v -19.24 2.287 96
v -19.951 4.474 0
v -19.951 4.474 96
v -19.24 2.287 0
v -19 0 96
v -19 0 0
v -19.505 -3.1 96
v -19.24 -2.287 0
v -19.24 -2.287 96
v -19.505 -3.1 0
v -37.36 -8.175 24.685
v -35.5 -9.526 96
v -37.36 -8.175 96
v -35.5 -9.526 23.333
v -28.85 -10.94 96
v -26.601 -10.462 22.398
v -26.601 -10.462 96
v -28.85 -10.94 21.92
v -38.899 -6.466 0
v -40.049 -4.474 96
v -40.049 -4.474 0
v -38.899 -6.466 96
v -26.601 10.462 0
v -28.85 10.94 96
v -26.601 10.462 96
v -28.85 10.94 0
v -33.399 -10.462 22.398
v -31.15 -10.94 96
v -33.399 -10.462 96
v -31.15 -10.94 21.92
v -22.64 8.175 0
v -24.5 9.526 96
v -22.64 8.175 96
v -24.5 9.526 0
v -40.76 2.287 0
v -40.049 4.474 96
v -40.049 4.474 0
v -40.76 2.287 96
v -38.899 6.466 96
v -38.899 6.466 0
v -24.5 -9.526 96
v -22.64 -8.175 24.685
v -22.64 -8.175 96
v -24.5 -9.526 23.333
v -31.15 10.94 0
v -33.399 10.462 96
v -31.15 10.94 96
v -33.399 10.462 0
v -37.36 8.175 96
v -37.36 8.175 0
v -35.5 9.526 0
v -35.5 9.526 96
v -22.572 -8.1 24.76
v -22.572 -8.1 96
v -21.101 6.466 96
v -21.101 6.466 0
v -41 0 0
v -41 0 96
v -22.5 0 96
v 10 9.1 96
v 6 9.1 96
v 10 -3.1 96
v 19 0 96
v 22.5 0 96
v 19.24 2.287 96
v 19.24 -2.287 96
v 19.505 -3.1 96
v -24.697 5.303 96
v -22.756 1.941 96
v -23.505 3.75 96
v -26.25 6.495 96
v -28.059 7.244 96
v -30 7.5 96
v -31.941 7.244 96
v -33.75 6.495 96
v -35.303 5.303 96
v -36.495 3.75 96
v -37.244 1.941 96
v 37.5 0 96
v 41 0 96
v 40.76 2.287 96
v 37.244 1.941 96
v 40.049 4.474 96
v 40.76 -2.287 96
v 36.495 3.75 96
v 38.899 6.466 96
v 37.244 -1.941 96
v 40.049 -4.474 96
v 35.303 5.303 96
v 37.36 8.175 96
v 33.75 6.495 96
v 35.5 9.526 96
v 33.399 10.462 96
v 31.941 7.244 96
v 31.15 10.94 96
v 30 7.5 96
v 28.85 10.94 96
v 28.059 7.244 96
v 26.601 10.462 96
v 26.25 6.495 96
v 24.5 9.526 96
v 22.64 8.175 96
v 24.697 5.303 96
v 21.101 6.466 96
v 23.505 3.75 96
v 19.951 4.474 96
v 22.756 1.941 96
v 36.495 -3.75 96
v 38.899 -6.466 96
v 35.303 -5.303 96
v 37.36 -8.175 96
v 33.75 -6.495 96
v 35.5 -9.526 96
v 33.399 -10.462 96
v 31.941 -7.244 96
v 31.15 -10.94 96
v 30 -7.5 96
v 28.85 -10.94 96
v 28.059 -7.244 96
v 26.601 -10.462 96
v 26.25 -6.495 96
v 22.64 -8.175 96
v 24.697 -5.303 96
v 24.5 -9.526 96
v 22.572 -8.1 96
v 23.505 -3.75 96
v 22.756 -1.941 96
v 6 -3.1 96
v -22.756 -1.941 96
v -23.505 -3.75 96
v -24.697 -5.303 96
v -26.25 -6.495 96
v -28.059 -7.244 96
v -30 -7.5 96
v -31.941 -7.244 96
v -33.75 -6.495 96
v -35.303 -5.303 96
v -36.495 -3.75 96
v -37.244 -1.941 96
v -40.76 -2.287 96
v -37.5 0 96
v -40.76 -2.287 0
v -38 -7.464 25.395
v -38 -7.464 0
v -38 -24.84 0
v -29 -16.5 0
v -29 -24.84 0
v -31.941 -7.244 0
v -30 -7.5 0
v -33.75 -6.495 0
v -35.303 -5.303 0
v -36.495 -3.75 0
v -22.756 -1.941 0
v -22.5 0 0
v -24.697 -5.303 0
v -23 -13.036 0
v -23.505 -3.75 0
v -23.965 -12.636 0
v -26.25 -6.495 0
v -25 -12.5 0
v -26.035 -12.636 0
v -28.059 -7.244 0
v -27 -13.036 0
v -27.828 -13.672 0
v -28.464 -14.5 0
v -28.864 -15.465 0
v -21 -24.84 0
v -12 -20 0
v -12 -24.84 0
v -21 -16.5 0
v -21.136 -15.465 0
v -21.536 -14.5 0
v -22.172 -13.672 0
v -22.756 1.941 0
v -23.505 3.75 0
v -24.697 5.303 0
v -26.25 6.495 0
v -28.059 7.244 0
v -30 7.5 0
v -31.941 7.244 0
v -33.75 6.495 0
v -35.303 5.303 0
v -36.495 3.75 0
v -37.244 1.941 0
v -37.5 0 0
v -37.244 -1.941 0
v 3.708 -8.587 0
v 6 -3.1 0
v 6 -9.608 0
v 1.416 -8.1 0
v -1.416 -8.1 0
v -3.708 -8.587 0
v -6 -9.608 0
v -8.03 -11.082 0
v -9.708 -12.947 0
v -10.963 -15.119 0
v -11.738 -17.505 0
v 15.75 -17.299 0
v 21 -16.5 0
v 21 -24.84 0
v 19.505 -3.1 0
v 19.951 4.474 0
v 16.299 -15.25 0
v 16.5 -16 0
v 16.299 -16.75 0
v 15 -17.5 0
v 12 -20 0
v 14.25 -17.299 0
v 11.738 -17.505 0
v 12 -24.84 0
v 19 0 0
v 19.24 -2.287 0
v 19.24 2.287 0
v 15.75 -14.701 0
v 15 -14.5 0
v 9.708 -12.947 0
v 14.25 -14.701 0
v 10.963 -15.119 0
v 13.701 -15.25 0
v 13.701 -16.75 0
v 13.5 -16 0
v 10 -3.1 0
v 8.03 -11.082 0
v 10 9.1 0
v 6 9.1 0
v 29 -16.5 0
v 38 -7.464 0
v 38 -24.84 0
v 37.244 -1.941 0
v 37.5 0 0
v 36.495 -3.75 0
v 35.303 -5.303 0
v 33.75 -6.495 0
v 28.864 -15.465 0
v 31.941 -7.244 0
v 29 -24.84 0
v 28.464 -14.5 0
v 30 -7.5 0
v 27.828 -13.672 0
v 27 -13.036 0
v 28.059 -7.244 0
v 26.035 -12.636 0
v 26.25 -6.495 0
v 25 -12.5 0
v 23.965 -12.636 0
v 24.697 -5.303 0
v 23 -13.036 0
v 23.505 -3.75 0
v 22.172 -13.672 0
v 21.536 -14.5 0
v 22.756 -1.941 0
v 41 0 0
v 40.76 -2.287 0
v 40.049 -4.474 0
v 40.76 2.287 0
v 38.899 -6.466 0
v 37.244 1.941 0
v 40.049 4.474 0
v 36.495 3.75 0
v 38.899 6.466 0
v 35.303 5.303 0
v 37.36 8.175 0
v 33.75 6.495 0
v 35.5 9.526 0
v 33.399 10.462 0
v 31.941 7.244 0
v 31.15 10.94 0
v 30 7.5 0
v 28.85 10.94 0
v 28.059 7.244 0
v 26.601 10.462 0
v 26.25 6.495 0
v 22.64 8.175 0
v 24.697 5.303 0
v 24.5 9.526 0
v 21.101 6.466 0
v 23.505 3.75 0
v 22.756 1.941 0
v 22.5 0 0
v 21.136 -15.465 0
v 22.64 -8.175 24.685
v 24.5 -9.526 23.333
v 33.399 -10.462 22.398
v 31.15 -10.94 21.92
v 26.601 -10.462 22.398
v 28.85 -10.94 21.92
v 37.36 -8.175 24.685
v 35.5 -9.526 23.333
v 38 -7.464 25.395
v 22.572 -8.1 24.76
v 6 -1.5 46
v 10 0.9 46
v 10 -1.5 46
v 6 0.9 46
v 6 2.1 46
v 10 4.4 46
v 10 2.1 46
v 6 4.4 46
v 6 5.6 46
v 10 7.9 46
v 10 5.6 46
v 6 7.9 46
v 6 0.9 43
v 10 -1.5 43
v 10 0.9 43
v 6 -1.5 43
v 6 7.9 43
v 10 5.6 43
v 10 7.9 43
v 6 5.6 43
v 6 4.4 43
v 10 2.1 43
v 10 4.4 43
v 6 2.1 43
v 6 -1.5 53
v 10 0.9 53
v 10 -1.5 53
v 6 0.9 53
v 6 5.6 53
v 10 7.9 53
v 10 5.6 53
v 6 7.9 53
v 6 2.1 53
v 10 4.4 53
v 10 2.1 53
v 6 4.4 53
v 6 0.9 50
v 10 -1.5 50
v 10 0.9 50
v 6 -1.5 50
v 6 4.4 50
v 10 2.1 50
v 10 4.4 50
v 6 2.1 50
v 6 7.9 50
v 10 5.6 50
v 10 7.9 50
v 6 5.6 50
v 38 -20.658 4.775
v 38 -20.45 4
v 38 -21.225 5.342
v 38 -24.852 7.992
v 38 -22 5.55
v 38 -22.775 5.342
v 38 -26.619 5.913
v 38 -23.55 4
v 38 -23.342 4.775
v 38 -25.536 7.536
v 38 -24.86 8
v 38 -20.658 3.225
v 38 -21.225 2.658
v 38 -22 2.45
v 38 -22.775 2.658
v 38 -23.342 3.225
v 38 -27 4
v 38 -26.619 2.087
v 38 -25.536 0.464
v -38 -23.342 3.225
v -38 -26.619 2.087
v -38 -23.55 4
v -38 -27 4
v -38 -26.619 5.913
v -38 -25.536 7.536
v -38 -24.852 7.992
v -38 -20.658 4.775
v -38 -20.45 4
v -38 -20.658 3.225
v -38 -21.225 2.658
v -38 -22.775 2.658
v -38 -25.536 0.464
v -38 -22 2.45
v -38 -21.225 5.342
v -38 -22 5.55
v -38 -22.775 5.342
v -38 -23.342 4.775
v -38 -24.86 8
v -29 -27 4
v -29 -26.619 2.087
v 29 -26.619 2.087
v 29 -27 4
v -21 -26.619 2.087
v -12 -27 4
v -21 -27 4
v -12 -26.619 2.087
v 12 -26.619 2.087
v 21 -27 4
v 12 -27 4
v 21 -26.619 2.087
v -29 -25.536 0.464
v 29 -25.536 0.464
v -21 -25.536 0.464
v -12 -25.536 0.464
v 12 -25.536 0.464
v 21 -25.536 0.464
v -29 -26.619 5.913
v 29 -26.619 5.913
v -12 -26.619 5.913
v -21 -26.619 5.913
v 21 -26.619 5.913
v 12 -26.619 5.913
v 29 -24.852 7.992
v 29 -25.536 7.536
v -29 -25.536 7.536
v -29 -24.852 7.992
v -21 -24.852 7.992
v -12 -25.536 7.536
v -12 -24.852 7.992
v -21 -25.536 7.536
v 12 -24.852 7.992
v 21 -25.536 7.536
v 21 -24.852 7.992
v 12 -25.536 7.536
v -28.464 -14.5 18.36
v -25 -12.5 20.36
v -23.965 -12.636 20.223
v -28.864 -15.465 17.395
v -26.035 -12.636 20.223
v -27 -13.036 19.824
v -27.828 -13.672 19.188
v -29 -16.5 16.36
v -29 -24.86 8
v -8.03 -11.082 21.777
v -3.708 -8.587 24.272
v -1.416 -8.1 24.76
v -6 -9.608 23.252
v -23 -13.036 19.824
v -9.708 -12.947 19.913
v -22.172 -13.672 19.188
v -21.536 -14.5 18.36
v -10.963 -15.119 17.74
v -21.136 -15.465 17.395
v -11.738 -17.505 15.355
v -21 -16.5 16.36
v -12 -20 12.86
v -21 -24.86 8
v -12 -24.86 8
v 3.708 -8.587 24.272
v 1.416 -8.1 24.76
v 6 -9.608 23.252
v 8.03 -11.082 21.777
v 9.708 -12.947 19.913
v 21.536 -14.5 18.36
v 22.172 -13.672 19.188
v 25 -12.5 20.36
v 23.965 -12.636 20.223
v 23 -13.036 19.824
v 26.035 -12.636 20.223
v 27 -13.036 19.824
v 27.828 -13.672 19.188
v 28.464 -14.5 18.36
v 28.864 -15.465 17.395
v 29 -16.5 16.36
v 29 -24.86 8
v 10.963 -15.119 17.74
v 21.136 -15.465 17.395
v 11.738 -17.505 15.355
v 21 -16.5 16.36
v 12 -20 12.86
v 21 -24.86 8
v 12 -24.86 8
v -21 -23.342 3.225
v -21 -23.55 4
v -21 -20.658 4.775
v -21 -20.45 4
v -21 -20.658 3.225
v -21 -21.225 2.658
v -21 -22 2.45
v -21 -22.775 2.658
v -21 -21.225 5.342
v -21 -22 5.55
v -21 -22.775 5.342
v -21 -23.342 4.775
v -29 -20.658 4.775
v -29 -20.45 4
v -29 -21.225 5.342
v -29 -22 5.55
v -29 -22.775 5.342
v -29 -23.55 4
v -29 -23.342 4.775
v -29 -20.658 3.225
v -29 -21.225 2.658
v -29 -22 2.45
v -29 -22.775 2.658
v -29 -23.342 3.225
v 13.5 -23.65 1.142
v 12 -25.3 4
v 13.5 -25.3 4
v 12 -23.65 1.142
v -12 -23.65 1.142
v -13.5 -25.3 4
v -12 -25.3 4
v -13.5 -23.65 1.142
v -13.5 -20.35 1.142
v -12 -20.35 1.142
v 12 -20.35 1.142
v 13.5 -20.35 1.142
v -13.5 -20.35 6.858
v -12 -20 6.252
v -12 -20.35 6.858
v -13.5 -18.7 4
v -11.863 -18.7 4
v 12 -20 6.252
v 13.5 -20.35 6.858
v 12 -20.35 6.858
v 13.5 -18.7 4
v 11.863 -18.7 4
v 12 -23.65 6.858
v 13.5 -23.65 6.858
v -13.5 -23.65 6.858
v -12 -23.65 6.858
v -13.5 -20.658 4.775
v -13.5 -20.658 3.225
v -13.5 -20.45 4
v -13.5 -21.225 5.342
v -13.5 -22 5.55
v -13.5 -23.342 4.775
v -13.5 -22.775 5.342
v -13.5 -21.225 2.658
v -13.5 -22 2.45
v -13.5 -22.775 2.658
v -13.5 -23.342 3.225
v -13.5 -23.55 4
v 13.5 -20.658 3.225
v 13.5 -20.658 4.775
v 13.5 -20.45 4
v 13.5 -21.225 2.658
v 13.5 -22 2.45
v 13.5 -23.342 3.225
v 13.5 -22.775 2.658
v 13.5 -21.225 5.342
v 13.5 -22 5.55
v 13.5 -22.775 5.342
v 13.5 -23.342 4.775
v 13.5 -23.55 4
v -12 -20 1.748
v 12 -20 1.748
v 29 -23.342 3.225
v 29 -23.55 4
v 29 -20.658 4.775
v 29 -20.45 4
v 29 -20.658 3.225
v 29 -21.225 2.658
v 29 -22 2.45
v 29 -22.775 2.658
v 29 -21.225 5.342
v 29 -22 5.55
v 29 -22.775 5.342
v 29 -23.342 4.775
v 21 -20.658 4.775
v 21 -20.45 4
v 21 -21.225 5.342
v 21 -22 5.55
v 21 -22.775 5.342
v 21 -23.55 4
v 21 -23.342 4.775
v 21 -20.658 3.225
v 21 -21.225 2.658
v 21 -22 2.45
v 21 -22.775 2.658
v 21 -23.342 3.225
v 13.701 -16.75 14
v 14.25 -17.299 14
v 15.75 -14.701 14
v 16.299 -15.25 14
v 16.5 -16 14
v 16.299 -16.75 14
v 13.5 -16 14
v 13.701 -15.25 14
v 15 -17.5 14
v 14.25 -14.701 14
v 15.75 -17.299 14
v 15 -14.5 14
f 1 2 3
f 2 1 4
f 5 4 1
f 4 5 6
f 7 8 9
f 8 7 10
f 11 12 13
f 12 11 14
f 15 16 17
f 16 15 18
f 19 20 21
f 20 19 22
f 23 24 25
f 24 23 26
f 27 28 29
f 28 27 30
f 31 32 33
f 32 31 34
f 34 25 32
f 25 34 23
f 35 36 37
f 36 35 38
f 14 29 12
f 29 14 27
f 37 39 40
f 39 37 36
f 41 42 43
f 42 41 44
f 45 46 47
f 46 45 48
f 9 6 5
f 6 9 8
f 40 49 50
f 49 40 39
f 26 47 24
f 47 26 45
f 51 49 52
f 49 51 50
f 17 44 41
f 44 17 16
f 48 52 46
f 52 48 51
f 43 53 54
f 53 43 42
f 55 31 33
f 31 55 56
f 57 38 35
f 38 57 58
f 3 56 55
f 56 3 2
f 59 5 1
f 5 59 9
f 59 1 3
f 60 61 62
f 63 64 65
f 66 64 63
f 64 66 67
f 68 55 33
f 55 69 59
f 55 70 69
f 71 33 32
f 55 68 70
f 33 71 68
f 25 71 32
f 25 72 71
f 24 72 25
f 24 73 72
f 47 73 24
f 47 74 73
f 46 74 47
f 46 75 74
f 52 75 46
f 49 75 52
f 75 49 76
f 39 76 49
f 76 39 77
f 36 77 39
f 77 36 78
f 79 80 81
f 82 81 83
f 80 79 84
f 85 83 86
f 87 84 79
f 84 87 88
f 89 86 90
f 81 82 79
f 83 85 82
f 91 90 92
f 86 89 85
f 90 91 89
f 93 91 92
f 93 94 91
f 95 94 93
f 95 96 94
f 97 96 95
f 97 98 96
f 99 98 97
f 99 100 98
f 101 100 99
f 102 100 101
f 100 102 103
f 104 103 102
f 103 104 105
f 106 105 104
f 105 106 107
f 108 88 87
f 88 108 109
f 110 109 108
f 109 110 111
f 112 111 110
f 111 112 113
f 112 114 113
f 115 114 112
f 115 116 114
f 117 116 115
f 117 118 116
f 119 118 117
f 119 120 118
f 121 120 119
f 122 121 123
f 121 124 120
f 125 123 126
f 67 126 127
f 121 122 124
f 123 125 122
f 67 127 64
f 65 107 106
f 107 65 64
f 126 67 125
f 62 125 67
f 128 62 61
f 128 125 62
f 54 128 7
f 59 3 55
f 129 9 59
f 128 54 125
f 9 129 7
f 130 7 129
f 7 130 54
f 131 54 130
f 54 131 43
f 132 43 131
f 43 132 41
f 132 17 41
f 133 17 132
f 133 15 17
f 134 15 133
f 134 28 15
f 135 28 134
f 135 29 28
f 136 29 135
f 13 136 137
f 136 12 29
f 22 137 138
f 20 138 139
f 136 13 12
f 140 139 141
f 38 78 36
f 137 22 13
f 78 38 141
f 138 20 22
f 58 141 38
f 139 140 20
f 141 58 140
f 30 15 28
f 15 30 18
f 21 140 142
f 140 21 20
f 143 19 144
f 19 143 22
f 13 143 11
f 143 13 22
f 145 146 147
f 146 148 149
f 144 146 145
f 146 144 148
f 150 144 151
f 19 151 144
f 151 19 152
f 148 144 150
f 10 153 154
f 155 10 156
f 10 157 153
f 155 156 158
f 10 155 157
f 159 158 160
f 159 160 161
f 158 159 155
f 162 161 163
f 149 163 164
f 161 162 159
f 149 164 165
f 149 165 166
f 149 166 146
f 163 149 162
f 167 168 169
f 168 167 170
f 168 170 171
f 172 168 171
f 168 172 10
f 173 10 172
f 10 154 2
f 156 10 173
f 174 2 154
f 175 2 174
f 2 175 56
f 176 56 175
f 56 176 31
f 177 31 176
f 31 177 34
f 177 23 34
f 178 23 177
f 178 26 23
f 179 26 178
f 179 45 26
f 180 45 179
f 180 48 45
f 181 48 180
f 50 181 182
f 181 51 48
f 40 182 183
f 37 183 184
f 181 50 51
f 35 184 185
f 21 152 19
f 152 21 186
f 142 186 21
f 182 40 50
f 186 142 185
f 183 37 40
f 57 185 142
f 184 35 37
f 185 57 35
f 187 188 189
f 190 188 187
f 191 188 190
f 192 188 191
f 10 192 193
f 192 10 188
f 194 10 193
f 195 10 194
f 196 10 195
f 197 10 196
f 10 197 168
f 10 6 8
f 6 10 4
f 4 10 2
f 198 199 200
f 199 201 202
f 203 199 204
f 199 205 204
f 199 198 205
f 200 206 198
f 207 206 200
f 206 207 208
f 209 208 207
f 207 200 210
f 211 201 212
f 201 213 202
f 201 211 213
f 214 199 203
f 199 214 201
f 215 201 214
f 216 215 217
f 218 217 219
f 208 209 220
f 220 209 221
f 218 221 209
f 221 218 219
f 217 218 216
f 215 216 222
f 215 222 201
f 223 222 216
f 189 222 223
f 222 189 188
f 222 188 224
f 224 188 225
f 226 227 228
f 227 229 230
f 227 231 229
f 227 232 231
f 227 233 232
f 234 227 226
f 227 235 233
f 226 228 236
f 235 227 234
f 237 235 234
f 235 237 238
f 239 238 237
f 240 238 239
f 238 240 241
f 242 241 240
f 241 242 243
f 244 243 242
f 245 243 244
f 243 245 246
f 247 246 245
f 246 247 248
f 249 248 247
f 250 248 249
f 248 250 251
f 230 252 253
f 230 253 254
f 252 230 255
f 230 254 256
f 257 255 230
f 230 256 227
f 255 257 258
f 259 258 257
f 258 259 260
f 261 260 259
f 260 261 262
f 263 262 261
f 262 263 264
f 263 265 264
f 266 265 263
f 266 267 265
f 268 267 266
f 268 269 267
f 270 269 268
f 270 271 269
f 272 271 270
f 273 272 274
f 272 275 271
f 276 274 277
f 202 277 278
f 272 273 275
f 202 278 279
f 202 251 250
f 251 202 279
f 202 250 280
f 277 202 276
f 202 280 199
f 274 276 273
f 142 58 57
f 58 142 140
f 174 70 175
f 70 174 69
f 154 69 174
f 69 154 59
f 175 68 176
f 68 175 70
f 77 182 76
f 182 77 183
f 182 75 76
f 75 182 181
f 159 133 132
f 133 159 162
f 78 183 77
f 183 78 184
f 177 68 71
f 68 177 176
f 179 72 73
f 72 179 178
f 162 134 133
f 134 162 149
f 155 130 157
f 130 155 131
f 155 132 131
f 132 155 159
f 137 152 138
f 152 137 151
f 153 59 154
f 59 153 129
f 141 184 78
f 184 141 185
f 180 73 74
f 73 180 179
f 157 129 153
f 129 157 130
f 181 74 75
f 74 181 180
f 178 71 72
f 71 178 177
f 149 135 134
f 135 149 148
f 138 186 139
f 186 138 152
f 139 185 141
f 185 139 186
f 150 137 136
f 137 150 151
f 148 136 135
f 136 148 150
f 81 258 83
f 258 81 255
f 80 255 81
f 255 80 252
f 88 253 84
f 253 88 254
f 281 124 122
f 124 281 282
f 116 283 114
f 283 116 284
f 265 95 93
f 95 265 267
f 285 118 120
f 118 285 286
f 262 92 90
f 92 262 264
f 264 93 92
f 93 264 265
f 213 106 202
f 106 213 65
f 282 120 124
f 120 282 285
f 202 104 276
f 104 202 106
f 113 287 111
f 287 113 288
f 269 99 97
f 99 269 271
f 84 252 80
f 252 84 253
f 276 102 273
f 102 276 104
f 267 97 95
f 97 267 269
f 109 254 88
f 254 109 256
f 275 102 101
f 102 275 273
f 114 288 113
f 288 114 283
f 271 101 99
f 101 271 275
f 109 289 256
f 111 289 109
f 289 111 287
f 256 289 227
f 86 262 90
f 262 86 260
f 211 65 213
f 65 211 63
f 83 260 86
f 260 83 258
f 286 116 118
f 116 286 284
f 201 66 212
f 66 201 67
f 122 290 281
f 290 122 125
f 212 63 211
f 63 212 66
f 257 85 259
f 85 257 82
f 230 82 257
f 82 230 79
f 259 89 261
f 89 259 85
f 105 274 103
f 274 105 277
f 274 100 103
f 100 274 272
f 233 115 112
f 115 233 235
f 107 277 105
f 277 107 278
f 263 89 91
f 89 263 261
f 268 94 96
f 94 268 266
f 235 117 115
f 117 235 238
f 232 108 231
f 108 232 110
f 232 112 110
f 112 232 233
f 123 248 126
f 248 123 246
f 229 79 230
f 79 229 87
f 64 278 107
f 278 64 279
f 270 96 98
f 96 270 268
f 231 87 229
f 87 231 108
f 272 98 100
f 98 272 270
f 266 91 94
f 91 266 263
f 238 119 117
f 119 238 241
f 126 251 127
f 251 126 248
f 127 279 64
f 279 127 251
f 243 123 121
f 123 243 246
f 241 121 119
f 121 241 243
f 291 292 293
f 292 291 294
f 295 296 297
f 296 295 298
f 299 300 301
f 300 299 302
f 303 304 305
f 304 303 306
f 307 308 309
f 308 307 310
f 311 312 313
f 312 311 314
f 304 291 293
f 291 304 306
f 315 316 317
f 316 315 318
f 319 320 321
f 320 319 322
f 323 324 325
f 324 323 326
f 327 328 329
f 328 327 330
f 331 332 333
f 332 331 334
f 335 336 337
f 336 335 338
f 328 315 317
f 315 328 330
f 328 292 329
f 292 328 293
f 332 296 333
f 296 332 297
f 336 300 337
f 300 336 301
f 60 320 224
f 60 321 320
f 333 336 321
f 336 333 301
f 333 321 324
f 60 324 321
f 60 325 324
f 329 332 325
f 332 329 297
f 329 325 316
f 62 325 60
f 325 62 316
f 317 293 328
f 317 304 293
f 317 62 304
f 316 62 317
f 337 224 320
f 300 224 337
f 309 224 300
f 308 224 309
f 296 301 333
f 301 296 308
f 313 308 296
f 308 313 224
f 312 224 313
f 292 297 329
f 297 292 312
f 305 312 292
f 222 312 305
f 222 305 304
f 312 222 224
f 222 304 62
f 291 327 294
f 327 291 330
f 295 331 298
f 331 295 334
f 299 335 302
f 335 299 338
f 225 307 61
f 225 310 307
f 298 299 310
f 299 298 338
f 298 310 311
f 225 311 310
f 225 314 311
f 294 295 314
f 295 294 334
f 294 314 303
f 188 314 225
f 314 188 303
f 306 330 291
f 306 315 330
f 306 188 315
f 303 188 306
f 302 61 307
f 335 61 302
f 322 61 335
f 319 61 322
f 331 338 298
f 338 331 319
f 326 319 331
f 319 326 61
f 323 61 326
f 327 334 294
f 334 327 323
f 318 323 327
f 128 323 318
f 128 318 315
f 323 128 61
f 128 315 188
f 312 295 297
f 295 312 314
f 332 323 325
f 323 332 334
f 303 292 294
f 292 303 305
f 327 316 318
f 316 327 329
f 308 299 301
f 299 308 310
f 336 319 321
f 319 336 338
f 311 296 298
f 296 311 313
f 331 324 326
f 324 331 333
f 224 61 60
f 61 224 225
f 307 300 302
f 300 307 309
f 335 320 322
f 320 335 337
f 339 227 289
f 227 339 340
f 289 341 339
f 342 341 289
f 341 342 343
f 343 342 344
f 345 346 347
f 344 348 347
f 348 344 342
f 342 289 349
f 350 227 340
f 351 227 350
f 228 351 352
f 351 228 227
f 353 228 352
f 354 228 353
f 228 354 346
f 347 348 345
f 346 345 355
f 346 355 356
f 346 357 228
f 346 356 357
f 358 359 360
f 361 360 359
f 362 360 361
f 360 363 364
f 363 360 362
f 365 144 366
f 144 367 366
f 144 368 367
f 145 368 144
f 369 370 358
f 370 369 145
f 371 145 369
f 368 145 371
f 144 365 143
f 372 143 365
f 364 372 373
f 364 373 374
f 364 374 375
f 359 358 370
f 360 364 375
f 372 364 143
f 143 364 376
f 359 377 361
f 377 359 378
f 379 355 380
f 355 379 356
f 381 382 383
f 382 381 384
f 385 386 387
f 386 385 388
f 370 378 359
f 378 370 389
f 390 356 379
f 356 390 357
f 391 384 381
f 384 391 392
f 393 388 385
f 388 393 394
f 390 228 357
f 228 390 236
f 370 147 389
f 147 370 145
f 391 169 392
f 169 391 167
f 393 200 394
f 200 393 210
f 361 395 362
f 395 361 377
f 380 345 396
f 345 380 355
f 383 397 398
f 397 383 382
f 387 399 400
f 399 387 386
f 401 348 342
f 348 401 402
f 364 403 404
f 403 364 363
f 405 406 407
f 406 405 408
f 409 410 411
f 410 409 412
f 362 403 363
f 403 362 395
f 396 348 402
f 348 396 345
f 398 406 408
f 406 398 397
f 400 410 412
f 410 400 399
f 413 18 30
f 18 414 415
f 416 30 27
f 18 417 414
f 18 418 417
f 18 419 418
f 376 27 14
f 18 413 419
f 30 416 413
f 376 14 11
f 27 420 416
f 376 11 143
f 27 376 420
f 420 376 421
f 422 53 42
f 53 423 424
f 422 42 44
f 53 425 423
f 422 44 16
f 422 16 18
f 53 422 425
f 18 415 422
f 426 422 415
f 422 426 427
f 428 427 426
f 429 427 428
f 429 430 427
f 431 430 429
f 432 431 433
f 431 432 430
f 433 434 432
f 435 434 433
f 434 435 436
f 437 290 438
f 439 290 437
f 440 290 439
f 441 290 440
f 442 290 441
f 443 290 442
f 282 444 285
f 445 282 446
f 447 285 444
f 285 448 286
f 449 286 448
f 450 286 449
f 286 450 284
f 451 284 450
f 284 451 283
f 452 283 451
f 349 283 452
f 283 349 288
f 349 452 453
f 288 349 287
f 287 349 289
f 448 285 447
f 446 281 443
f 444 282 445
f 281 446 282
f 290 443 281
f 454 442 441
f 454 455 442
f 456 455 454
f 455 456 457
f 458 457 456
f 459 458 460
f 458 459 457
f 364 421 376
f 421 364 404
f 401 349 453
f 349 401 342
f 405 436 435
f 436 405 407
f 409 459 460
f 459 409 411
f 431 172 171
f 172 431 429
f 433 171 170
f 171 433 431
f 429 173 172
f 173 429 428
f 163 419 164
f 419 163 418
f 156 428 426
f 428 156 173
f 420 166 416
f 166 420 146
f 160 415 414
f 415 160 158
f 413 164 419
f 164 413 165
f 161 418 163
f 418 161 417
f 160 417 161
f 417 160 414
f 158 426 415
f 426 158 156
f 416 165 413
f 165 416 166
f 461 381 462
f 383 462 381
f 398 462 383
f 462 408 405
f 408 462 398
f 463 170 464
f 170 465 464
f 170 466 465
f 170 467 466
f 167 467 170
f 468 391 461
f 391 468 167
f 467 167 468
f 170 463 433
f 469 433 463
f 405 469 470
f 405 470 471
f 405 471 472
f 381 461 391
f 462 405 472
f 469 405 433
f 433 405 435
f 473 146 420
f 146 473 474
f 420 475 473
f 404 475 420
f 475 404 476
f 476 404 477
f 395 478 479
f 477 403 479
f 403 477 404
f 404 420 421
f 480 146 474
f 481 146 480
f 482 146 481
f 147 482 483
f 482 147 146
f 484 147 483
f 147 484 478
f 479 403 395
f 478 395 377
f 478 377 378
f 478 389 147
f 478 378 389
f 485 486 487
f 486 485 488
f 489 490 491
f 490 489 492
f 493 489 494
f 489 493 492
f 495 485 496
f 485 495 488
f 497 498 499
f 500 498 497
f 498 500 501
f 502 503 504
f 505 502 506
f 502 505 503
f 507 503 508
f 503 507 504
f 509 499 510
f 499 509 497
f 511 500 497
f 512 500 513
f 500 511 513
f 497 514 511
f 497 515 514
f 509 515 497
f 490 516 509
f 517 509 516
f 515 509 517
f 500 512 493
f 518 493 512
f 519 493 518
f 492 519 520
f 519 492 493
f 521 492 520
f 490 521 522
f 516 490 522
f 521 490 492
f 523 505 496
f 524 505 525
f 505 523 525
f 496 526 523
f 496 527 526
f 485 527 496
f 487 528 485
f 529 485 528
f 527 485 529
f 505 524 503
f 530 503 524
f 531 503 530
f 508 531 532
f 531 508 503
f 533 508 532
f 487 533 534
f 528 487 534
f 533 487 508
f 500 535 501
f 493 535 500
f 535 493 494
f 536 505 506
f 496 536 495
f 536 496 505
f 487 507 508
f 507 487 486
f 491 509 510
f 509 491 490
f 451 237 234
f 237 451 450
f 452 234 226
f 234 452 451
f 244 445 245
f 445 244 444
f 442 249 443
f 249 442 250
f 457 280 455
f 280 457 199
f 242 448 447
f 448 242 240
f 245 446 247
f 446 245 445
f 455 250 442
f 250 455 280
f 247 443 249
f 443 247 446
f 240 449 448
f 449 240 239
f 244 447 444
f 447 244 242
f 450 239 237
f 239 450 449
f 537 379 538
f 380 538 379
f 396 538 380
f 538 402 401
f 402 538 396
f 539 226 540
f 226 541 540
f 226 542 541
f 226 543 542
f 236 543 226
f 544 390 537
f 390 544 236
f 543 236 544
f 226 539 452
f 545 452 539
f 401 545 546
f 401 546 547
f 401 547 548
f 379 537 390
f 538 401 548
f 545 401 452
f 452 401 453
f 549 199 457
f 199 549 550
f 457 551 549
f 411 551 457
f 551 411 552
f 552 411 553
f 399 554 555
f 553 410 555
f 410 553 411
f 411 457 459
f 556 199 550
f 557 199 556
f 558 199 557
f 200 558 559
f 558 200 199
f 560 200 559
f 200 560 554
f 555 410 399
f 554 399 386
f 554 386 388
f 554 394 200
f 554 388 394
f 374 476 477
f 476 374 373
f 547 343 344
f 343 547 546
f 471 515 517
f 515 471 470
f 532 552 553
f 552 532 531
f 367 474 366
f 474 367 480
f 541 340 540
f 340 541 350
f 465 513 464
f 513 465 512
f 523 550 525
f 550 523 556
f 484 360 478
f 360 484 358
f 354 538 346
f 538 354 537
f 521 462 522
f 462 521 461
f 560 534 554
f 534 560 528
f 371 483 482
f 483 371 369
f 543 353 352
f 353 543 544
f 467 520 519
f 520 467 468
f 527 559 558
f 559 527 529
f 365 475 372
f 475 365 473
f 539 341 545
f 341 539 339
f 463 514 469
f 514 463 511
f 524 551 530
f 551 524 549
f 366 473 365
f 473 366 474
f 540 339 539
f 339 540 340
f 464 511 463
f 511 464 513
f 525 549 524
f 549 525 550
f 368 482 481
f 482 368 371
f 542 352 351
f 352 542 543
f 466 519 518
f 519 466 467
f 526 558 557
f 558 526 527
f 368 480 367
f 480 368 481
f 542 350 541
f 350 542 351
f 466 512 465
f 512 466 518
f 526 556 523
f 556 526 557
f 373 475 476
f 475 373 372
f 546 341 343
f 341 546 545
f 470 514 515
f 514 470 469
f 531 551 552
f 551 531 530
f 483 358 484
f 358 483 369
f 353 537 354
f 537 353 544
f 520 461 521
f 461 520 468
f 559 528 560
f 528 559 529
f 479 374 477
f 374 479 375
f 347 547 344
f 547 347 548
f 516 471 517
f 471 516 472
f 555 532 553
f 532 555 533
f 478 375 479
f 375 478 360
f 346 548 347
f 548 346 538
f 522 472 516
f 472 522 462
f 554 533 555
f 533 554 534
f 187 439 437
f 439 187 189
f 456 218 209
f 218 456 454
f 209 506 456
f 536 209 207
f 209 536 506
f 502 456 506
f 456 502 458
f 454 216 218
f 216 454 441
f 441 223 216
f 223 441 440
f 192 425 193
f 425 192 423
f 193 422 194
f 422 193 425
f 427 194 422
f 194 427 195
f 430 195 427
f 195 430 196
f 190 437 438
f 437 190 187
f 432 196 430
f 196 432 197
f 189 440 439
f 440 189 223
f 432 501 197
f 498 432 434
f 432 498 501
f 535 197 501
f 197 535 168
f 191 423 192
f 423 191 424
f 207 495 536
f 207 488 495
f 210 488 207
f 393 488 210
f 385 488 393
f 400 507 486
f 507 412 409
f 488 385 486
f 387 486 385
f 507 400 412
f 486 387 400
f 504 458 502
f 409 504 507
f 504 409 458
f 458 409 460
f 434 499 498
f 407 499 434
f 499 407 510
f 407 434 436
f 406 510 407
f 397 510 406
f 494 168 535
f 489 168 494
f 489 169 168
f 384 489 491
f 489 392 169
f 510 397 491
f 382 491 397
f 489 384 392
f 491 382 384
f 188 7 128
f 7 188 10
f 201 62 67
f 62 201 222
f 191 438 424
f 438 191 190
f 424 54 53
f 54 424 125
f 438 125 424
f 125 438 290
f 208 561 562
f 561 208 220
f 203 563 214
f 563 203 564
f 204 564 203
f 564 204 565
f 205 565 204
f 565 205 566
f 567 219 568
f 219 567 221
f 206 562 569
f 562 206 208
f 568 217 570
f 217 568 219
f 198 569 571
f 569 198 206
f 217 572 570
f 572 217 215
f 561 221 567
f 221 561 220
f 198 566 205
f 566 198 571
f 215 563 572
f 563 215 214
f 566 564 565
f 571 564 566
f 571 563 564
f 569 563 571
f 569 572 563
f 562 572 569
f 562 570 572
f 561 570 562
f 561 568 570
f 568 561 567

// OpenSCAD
// file: configuration.scad
motor_end_height=44;
idler_end_height=40;
carriage_height=24;
platform_thickness=8;
bed_thickness=12;
pcb_thickness=2;
rod_length=120;
smooth_rod_length=300;
tower_radius = 120;
platform_hinge_offset=33;
carriage_hinge_offset=22;
// main file
include <configuration.scad>

width = 76;
height = carriage_height*4;

offset = 25;
cutout = 8;
middle = 2*offset - width/2;

module parallel_joints(reinforced) {
  difference() {
    union() {
      intersection() {
        cube([width, 20, 8], center=true);
        rotate([0, 90, 0]) cylinder(r=5, h=width, center=true);
      }
      intersection() {
        translate([0, 18, 4]) rotate([45, 0, 0])
          cube([width, reinforced, reinforced], center=true);
        translate([0, 0, 20]) cube([width, 35, 40], center=true);
      }
      translate([0, 8, 0]) cube([width, 16, 8], center=true);
    }
    rotate([0, 90, 0]) cylinder(r=1.55, h=80, center=true, $fn=12);

    for (x = [-offset, offset]) {
      translate([x, 5.5, 0])
        cylinder(r=cutout/2, h=100, center=true, $fn=24);
      translate([x, -4.5, 0])
        cube([cutout, 20, 100], center=true);
      translate([0, 0, 0]) rotate([0, 90, 0]) rotate([0, 0, 30])
         cylinder(r=3.3, h=offset + 2, center=true, $fn=6);
       
     }
    translate([0, 2, 0]) cylinder(r=middle, h=100, center=true);
    translate([0, -8, 0]) cube([2*middle, 20, 100], center=true);
  }
}

module lm8uu_mount(d, h) {
  union() {
    difference() {
      intersection() {
        cylinder(r=11, h=h, center=true);
        //translate([0, -8, 0]) cube([19, 13, h+1], center=true);
      }
      cylinder(r=d/2, h=h+1, center=true);
    }
  }
}

module belt_mount() {
  difference() {
    union() {
      difference() {
        translate([8, 2, 0]) cube([4, 13, height], center=true);
        for (z = [-3.5, 3.5])
          translate([8, 5, z])
            cube([5, 13, 3], center=true);
      }
      for (y = [1.5, 5, 8.5]) {
        translate([8, y, 0]) cube([4, 1.2, height], center=true);
      }
    }
  }
}

module carriage() {
  translate([0, 0, height/2]) 
  union() {
    for (x = [-30, 30]) {
      translate([x, 0, 0]) lm8uu_mount(d=15, h=height);
    }
    belt_mount();
    difference() {
      union() {
        translate([0, -5.6, 0])
          cube([50, 5, height], center=true);
        translate([0, -carriage_hinge_offset, -height/2+4])
          parallel_joints(29.5);
      }
      // Screw hole for adjustable top endstop.
      translate([15, -16, -height/2+4])
        cylinder(r=1.5, h=20, center=true, $fn=12);
      for (x = [-30, 30]) {
        translate([x, 0, 0])
          cylinder(r=8, h=height+1, center=true);
        // Zip tie tunnels.
       // for (z = [-height/2+4, height/2-4])
        //  translate([x, 0, z])
         //   cylinder(r=13, h=3, center=true);
      }
    }
  }
}

carriage();

// Uncomment the following lines to check endstop alignment.
 //use <idler_end.scad>;
// translate([0, 0, -20]) rotate([180, 0, 0]) idler_end();
